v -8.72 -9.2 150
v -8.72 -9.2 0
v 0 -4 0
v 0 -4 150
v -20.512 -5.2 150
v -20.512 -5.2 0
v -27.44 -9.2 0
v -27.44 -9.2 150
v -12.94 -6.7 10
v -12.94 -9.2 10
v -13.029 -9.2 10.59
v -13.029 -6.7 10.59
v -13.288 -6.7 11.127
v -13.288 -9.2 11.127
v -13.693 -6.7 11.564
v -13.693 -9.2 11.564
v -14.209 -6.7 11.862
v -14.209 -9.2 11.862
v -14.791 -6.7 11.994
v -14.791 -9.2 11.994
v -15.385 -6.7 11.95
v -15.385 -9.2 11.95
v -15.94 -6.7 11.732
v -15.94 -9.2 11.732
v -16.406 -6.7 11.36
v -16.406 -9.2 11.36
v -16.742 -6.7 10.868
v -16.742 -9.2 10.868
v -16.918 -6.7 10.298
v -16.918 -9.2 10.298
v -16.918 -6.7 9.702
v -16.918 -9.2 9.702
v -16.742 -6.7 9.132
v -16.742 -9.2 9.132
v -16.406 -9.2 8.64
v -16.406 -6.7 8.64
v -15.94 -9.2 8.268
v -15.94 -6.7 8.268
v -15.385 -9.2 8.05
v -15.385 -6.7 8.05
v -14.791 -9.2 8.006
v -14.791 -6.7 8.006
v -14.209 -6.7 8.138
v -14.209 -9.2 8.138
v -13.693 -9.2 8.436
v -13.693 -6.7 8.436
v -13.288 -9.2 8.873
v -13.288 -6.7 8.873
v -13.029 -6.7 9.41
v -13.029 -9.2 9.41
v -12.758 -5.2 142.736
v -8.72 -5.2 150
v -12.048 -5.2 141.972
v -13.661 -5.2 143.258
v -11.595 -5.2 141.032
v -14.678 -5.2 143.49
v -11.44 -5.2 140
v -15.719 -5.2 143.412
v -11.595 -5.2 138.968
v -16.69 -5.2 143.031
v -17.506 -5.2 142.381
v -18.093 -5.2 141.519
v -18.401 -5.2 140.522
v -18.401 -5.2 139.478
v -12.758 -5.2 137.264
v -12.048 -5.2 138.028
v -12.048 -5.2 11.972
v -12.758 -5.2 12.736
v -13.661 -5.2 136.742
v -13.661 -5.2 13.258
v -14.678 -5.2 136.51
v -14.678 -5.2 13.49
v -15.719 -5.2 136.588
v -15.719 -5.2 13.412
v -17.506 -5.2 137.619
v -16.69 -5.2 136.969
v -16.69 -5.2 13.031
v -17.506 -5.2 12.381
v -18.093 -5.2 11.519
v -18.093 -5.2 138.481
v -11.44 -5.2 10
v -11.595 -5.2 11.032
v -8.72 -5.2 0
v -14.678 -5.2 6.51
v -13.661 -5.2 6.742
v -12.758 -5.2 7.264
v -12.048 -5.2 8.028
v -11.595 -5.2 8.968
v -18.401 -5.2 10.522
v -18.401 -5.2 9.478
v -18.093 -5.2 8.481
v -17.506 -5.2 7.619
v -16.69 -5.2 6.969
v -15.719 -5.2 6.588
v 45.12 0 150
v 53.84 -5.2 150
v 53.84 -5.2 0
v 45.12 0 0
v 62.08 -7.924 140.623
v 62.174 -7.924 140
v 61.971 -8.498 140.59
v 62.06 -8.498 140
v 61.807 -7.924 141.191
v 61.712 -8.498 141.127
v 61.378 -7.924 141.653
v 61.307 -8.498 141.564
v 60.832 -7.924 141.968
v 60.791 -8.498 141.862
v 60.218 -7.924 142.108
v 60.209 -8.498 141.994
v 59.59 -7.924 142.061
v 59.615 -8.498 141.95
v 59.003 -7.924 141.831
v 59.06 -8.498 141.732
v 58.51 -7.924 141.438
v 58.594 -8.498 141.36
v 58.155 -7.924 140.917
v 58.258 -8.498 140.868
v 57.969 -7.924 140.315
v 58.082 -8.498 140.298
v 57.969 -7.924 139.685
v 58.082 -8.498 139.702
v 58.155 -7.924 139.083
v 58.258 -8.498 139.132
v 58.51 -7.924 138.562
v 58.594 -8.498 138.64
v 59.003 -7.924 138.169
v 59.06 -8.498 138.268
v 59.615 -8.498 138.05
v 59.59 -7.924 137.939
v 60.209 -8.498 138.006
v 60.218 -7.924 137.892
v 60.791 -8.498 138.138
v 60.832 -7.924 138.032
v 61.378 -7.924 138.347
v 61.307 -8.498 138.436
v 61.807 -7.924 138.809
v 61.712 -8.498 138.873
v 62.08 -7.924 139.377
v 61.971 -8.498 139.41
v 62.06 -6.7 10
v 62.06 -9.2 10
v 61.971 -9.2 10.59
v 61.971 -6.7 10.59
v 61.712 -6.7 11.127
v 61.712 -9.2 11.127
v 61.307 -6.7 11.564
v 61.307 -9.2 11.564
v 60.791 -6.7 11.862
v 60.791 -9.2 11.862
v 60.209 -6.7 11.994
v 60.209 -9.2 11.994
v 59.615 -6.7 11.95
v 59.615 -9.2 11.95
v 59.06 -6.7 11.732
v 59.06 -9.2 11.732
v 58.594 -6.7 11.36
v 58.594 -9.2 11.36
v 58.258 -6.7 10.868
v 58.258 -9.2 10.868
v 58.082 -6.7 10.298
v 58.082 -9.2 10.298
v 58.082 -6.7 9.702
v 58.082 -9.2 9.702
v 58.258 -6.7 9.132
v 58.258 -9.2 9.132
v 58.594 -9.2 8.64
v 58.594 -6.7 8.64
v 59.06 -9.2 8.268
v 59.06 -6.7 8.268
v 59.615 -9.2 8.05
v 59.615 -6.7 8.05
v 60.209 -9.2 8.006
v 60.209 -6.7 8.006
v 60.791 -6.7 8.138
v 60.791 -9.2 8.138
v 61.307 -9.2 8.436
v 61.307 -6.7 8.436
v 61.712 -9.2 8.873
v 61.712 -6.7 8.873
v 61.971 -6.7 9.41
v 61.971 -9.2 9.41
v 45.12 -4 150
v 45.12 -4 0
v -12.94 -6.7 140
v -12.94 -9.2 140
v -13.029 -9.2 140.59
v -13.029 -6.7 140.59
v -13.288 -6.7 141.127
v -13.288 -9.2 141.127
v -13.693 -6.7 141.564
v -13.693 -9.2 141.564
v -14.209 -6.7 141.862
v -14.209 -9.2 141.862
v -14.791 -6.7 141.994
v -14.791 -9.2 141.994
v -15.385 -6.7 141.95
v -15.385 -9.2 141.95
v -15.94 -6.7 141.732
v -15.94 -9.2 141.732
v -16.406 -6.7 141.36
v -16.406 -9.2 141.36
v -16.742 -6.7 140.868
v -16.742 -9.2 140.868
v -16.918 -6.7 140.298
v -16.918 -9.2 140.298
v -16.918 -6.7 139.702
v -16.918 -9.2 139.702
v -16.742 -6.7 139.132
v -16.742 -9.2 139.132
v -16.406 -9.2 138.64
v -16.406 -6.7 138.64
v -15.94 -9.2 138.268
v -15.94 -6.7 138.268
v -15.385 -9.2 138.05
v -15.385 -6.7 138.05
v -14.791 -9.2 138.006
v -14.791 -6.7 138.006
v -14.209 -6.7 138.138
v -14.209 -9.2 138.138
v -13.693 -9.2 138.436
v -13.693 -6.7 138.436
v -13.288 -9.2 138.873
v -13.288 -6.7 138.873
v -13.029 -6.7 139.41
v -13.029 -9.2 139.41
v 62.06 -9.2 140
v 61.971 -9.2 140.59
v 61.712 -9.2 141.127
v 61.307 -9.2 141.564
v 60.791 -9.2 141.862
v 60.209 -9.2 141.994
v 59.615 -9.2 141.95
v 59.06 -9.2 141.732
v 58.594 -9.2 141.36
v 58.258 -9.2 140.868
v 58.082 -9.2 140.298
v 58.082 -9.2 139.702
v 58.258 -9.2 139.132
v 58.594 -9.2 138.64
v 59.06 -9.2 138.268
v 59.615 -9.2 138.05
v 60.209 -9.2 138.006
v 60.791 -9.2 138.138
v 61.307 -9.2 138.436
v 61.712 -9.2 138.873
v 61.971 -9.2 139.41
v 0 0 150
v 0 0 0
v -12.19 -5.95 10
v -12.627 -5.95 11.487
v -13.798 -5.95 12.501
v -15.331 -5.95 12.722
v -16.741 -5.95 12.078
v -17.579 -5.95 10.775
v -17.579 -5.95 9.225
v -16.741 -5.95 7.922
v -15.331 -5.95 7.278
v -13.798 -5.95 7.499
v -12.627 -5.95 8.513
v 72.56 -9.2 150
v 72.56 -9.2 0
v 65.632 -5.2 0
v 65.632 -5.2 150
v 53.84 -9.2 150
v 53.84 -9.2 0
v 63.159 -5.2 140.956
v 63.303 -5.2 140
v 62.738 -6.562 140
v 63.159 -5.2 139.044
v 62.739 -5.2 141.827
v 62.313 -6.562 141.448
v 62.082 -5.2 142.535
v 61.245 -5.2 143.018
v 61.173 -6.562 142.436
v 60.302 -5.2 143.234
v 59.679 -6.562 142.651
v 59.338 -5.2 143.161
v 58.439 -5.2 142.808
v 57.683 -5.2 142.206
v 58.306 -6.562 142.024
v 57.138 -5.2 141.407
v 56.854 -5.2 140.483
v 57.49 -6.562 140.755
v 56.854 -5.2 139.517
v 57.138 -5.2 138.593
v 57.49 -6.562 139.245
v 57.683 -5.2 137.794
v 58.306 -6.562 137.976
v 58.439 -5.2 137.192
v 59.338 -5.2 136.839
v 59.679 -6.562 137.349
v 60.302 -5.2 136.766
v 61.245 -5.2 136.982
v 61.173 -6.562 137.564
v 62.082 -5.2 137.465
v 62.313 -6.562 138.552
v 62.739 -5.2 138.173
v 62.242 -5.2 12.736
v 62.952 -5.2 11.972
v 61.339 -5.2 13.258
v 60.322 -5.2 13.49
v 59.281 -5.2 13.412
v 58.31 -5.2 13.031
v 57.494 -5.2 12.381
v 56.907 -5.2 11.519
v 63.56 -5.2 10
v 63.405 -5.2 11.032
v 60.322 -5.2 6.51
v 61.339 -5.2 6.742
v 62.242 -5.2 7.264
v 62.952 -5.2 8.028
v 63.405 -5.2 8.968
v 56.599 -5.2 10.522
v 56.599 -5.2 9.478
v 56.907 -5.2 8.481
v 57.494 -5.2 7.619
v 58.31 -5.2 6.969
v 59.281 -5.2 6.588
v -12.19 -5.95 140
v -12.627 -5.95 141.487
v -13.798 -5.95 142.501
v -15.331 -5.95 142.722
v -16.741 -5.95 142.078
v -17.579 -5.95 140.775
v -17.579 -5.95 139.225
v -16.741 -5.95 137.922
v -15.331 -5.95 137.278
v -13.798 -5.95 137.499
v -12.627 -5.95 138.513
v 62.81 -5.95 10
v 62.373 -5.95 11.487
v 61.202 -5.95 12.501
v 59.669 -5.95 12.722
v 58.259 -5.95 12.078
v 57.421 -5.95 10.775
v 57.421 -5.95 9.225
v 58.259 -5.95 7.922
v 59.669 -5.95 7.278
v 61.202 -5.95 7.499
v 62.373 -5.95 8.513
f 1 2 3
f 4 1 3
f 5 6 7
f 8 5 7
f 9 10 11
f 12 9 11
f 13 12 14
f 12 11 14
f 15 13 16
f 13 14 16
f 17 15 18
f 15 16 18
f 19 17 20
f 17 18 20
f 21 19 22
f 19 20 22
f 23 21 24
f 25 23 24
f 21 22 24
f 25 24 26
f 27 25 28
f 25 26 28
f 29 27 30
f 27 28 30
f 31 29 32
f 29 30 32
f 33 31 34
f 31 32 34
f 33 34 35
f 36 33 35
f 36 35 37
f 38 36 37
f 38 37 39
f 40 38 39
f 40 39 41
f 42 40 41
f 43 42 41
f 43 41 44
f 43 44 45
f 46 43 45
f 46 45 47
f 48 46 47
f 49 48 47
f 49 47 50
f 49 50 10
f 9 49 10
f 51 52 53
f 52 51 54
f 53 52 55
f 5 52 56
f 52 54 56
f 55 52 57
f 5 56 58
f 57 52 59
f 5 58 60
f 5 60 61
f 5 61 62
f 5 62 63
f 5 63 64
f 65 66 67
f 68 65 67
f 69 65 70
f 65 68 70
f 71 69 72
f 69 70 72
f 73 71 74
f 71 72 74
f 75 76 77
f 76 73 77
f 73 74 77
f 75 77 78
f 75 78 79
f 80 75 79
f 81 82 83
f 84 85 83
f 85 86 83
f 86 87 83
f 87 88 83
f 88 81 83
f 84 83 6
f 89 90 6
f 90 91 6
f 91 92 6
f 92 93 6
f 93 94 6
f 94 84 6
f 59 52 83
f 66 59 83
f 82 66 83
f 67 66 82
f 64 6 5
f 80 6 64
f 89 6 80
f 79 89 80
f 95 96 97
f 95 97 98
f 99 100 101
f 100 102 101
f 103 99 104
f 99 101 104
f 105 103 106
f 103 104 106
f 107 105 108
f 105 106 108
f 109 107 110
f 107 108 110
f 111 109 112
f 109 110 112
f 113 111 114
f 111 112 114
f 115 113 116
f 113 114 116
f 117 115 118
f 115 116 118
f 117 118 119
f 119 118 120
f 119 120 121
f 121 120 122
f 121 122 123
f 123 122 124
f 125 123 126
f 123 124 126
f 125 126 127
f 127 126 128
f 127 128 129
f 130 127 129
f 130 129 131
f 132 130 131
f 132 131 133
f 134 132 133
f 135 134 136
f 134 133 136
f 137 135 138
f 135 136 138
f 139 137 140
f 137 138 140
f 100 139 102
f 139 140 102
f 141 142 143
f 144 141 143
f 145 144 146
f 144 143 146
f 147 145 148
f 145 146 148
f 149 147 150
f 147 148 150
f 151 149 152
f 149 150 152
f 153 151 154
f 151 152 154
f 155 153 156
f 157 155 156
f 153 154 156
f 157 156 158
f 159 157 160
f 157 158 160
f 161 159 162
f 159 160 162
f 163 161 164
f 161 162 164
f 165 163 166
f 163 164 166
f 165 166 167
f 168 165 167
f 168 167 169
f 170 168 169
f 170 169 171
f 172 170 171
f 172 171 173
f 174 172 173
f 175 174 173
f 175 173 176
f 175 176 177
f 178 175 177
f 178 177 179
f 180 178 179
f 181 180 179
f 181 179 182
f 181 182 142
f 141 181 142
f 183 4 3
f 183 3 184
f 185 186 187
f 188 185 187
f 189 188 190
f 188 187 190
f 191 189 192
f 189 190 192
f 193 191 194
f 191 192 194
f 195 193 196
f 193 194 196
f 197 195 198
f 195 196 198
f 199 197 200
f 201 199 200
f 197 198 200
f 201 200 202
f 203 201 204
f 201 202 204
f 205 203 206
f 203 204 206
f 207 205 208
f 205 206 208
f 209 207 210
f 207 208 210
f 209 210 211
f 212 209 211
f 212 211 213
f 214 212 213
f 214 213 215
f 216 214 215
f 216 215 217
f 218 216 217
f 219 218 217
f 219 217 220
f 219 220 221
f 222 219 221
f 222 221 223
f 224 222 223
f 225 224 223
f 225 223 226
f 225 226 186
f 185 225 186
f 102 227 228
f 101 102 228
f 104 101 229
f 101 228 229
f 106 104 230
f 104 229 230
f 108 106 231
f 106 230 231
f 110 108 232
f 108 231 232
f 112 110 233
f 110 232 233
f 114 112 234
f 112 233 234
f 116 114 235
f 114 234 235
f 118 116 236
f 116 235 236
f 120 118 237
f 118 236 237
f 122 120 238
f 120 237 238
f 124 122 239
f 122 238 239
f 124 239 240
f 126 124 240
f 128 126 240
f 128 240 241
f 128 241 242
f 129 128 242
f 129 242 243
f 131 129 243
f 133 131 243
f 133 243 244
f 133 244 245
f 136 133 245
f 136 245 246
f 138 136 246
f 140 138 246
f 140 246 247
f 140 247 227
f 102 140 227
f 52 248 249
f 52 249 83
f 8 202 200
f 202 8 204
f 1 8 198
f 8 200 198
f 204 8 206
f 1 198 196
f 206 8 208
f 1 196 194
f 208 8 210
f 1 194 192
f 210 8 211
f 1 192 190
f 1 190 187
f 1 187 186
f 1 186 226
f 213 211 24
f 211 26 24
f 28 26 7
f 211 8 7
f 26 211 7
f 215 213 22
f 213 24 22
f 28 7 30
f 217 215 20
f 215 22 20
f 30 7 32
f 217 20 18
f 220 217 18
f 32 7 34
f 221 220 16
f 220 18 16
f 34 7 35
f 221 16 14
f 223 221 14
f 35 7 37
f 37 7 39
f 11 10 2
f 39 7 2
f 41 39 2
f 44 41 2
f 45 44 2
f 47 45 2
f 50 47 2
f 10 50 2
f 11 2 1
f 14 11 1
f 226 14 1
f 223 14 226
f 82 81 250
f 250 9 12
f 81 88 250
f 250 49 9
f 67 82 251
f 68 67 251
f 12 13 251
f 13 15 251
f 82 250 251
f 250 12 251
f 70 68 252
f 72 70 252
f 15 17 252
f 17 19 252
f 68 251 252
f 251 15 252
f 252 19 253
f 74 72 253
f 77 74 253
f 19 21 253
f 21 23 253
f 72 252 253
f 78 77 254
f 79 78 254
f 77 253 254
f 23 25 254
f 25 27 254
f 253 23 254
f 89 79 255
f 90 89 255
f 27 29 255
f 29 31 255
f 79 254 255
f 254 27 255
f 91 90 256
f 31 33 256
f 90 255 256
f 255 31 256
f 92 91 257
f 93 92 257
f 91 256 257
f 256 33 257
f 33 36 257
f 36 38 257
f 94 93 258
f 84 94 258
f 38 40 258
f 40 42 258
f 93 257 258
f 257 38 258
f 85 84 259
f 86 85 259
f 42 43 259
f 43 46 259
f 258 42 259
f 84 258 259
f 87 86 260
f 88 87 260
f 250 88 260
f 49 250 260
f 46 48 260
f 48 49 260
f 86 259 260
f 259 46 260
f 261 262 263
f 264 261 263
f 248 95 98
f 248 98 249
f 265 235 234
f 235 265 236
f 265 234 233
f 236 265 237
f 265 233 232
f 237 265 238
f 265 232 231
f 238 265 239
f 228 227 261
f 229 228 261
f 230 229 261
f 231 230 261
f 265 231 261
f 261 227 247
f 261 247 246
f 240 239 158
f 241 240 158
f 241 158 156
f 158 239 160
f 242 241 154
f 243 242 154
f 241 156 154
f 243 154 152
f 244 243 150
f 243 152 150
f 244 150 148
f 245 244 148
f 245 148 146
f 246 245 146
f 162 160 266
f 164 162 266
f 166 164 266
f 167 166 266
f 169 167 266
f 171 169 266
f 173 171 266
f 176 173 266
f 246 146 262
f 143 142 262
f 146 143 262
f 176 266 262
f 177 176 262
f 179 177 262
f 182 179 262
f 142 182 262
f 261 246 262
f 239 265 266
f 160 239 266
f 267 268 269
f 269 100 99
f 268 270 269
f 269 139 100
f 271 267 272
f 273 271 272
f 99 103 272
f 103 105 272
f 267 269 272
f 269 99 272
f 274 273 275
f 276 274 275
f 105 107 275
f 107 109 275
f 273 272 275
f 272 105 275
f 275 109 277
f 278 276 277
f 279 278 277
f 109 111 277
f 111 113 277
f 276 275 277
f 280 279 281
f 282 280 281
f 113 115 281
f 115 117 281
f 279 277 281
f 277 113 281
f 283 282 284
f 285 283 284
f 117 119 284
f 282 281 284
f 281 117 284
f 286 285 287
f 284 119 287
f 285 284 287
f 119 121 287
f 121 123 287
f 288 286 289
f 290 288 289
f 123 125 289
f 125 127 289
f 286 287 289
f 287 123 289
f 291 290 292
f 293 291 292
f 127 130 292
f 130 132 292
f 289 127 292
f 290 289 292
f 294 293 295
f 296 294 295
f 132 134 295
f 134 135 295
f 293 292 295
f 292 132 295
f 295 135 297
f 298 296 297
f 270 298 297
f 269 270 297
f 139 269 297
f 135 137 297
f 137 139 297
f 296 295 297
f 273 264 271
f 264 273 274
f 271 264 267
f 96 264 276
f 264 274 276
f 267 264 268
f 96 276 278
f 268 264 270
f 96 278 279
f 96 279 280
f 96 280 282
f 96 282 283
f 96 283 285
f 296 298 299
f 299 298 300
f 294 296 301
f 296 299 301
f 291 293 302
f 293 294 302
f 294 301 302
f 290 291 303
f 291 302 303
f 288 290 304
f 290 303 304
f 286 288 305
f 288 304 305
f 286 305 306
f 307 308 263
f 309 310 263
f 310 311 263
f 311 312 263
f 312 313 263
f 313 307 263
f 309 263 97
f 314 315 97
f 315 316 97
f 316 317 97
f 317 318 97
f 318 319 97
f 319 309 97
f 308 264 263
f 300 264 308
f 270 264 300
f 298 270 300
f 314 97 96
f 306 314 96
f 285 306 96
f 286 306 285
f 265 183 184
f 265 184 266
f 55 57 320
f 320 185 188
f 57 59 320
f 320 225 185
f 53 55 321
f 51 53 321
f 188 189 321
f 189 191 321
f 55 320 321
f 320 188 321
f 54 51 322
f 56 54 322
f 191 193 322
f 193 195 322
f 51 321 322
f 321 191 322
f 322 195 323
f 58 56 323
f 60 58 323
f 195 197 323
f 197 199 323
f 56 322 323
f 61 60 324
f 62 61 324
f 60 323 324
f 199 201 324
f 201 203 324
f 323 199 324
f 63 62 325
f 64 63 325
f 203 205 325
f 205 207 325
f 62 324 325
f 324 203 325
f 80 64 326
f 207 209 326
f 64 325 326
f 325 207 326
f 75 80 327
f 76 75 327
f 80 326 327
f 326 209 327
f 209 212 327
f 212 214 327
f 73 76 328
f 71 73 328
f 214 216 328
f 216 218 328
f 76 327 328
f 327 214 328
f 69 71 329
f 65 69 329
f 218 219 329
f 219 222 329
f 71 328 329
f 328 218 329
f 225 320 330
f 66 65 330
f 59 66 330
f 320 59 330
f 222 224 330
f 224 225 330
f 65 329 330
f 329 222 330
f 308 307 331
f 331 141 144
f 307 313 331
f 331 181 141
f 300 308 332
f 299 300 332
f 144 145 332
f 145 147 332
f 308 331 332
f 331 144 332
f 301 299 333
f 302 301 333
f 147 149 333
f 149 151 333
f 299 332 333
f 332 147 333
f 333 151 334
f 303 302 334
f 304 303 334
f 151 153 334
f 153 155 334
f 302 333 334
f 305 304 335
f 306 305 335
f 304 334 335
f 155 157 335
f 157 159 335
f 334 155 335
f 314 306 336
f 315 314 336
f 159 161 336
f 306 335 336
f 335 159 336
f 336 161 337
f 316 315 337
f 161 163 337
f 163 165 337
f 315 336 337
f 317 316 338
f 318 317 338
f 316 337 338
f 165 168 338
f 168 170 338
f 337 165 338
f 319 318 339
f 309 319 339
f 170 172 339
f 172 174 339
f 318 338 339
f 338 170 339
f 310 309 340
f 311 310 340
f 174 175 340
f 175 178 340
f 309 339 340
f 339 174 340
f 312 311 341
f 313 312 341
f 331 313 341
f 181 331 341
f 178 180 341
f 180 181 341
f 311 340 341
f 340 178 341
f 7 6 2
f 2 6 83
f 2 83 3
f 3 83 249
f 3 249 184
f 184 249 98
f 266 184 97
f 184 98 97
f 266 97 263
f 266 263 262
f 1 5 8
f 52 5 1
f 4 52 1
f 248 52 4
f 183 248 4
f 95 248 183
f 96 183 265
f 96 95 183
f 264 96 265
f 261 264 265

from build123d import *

# Parameters (mm, degrees)
F0_W     = 22.5599961265
F0_H     = 4
F1_DEPTH = 150
F2_R     = 2
F3_DEPTH = 9.20100235
F4_SIZE  = 1


# Not quite as in the source:
# - a fillet or chamfer that OpenCascade refuses, or shapes differently, is made with other operations: its cross-section is extruded or revolved along the edge and cut away or added


with BuildPart() as f1:
    # F0 (on Top) → F1 (new body)
    with BuildSketch(Plane.XY):
        Polygon((0, -4), (0, 0), (-8.7200025445, -5.20000235), (-20.5118006432, -5.20000235), (-27.4400038735, -9.20000235), (-8.7200025445, -9.20000235), align=None)
        with Locations((11.2799980633, -2)):
            Rectangle(F0_W, F0_H)
        with Locations((33.8399941898, -2)):
            Rectangle(F0_W, F0_H)
        Polygon((53.8399947975, -5.20000235), (45.119992253, 0), (45.119992253, -4), (53.8399947975, -9.20000235), (72.5599961265, -9.20000235), (65.6317928962, -5.20000235), align=None)
    extrude(amount=F1_DEPTH)

    # F2 (on face) → F3 (cut, through all)
    with BuildSketch(Plane.XZ.offset(9.20000235)):
        with Locations((-14.9400038735, 140)):
            Circle(F2_R)
        with Locations((60.0599961265, 140)):
            Circle(F2_R)
        with Locations((-14.9400038735, 10)):
            Circle(F2_R)
        with Locations((60.0599961265, 10)):
            Circle(F2_R)
    extrude(amount=-F3_DEPTH, mode=Mode.SUBTRACT)

    # F4
    f4_edges = [f1.edges().sort_by_distance(p)[0] for p in [
        (58.059996, -5.200002, 140),
    ]]
    chamfer(f4_edges, length=F4_SIZE)

    # F5: chamfer of 2 on 1 edges, made by hand

    # F5_s1 → F5_t2 (revolve, cut)
    with BuildSketch(Plane.XY.offset(140)):
        Polygon((63.4742096889, -4.7857887876), (62.0599961265, -8.20000235), (62.0599961265, -6.20000235), align=None)
    revolve(axis=Axis((60.0599961265, -6.20000235, 140), (0, -1, 0)), mode=Mode.SUBTRACT)

    # F6: chamfer of 1.5 on 4 edges, made by hand

    # F6_s1 → F6_t2 (revolve, cut)
    with BuildSketch(Plane.XY.offset(10)):
        Polygon((63.5599961265, -5.20000235), (62.0599961265, -6.70000235), (62.0599961265, -5.20000235), align=None)
    revolve(axis=Axis((60.0599961265, -5.20000235, 10), (0, -1, 0)), mode=Mode.SUBTRACT)

    # F6_s3 → F6_t4 (revolve, cut)
    with BuildSketch(Plane.XY.offset(10)):
        Polygon((-11.4400038735, -5.20000235), (-12.9400038735, -6.70000235), (-12.9400038735, -5.20000235), align=None)
    revolve(axis=Axis((-14.9400038735, -5.20000235, 10), (0, -1, 0)), mode=Mode.SUBTRACT)

    # F6_s5 → F6_t6 (revolve, cut)
    with BuildSketch(Plane.XY.offset(140)):
        Polygon((-11.4400038735, -5.20000235), (-12.9400038735, -6.70000235), (-12.9400038735, -5.20000235), align=None)
    revolve(axis=Axis((-14.9400038735, -5.20000235, 140), (0, -1, 0)), mode=Mode.SUBTRACT)

    # F6_s7 → F6_t8 (revolve, cut)
    with BuildSketch(Plane.XY.offset(140)):
        Polygon((62.1741768278, -7.9243457525), (62.0599961265, -8.498370901), (62.0599961265, -8.20000235), align=None)
    revolve(axis=Axis((60.0599961265, -8.20000235, 140), (0, -1, 0)), mode=Mode.SUBTRACT)


solid = f1.part
